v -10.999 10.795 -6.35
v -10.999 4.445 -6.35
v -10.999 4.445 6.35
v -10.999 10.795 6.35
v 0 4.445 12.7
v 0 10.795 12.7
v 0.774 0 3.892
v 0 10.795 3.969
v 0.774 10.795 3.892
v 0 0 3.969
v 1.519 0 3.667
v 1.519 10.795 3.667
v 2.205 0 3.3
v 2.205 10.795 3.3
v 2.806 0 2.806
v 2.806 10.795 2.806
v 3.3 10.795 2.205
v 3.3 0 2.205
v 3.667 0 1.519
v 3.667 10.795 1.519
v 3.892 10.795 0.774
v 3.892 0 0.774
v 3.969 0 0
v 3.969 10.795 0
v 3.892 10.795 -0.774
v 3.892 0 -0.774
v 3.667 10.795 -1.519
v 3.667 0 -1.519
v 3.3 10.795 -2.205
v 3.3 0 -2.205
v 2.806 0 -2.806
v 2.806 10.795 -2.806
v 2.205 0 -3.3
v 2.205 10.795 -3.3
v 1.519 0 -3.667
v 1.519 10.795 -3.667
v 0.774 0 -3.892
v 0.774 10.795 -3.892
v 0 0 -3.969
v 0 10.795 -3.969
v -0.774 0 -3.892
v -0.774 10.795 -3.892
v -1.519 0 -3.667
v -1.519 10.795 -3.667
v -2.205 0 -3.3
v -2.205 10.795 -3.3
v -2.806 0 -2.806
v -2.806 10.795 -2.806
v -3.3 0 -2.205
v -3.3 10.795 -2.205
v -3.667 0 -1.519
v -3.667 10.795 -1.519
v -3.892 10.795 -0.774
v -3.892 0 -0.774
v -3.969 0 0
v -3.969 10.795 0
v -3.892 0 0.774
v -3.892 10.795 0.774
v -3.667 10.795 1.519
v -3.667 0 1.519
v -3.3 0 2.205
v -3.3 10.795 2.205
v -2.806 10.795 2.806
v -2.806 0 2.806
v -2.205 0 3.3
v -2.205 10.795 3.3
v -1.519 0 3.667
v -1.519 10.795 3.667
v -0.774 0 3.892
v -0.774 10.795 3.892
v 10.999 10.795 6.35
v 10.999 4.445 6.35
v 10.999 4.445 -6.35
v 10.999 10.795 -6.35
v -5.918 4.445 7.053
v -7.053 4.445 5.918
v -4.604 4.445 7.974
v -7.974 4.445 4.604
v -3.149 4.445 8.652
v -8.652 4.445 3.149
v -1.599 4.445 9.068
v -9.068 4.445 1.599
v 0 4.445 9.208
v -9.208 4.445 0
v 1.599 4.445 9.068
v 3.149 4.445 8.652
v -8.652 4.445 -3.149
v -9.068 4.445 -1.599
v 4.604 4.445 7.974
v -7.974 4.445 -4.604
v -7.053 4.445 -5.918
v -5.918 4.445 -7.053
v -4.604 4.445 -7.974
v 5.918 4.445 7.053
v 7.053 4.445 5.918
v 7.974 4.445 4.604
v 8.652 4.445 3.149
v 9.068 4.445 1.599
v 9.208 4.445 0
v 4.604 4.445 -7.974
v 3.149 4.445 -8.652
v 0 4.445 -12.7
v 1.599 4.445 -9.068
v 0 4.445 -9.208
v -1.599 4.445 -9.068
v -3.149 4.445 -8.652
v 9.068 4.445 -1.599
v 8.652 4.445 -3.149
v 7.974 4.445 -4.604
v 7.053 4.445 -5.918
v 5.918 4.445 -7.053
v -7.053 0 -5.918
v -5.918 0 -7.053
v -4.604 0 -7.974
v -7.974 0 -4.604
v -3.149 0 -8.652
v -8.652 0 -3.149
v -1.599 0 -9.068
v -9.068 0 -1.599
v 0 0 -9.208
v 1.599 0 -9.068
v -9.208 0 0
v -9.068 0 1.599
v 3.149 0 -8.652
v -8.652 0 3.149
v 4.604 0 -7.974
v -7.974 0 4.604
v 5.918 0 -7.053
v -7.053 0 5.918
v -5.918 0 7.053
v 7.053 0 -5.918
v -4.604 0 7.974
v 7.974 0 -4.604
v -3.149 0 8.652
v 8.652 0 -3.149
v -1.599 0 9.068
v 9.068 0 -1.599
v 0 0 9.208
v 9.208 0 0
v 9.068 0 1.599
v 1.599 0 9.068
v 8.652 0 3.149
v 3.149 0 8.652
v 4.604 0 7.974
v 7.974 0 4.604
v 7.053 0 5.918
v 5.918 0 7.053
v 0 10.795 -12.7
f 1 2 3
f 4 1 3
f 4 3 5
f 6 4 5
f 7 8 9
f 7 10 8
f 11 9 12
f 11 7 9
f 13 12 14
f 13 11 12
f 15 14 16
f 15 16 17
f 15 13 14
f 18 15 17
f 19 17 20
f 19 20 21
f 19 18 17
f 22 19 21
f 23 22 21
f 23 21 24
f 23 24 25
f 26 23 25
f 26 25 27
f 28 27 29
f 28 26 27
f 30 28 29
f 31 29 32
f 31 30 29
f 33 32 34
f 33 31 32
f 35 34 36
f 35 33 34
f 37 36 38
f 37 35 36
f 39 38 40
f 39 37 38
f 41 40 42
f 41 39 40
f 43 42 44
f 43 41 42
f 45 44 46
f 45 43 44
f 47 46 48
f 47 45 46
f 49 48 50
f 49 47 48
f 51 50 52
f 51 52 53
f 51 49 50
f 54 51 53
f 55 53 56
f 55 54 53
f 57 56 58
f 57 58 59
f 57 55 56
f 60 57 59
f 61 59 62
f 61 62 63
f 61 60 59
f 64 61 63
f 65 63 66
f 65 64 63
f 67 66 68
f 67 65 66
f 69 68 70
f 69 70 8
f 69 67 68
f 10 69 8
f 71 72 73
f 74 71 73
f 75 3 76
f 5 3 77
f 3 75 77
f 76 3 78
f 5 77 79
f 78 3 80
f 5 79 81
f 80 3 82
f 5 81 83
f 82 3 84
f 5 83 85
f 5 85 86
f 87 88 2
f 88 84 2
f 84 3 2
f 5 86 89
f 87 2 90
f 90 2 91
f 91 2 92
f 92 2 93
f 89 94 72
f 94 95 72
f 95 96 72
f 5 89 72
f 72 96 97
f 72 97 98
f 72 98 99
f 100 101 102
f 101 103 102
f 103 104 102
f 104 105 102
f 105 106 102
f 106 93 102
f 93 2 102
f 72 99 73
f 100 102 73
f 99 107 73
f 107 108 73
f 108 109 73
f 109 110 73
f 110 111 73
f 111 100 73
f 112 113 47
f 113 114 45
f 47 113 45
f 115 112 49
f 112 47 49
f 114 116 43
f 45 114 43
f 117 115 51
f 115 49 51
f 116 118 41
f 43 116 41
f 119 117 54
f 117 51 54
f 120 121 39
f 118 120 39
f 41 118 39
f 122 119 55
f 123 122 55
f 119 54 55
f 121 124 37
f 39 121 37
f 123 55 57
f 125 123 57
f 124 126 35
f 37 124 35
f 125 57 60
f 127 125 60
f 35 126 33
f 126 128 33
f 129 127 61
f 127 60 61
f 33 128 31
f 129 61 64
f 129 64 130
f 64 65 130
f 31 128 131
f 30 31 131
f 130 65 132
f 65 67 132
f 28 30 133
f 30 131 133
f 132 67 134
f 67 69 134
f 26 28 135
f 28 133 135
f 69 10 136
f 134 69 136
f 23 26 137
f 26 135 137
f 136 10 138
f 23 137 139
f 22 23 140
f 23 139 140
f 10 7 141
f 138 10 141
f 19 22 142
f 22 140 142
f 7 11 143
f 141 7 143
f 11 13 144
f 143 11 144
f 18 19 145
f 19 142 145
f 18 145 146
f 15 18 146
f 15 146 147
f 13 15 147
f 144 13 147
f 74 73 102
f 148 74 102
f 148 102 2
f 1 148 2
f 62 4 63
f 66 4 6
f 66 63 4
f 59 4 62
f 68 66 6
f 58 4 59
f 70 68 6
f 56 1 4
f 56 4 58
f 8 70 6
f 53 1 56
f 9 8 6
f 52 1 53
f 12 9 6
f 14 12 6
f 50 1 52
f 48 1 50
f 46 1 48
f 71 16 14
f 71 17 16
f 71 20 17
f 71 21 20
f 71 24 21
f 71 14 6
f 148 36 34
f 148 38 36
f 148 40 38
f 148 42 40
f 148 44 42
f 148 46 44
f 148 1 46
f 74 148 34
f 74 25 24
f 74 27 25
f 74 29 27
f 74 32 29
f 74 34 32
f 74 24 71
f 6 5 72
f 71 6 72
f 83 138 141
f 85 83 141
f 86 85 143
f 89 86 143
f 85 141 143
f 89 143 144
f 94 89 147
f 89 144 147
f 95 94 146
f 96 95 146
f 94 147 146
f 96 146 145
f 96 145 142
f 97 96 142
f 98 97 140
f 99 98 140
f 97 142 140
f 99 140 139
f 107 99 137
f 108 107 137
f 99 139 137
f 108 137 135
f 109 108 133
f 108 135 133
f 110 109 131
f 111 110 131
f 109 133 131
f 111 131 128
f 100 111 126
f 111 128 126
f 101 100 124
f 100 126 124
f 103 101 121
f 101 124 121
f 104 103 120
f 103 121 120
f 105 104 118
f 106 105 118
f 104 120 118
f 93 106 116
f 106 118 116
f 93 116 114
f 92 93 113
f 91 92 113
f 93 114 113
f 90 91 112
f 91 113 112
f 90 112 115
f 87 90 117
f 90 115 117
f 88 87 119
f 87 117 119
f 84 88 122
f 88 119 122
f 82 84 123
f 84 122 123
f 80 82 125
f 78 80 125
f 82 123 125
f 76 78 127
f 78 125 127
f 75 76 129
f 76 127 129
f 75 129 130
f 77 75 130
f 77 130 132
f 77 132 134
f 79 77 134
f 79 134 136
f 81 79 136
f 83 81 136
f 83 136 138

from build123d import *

# Parameters (mm, degrees)
SKETCH1_R           = 9.2075
SKETCH1_R_2         = 3.96875
BOSS_EXTRUDE1_DEPTH = 4.445
SKETCH2_R           = 3.96875
BOSS_EXTRUDE2_DEPTH = 6.35


with BuildPart() as part:
    # Sketch1 → Boss-Extrude1 (new body)
    with BuildSketch(Plane(origin=(0, 0, 0), x_dir=(1, 0, 0), z_dir=(0, 1, 0))):
        with Locations(Location((0, 0, 0), (0, 0, 270))):  # turned: the seam where the file's is
            Circle(SKETCH1_R)
        with Locations(Location((0, 0, 0), (0, 0, 270))):  # turned: the seam where the file's is
            Circle(SKETCH1_R_2, mode=Mode.SUBTRACT)
    extrude(amount=BOSS_EXTRUDE1_DEPTH)

    # Sketch2 → Boss-Extrude2 (add)
    with BuildSketch(Plane(origin=(0, 4.445, 0), x_dir=(1, 0, 0), z_dir=(0, 1, 0))):
        Polygon((0, 12.7), (-10.998522628, 6.35), (-10.998522628, -6.35), (0, -12.7), (10.998522628, -6.35), (10.998522628, 6.35), align=None)
        with Locations(Location((0, 0, 0), (0, 0, 270))):  # turned: the seam where the file's is
            Circle(SKETCH2_R, mode=Mode.SUBTRACT)
    extrude(amount=BOSS_EXTRUDE2_DEPTH)


solid = part.part
